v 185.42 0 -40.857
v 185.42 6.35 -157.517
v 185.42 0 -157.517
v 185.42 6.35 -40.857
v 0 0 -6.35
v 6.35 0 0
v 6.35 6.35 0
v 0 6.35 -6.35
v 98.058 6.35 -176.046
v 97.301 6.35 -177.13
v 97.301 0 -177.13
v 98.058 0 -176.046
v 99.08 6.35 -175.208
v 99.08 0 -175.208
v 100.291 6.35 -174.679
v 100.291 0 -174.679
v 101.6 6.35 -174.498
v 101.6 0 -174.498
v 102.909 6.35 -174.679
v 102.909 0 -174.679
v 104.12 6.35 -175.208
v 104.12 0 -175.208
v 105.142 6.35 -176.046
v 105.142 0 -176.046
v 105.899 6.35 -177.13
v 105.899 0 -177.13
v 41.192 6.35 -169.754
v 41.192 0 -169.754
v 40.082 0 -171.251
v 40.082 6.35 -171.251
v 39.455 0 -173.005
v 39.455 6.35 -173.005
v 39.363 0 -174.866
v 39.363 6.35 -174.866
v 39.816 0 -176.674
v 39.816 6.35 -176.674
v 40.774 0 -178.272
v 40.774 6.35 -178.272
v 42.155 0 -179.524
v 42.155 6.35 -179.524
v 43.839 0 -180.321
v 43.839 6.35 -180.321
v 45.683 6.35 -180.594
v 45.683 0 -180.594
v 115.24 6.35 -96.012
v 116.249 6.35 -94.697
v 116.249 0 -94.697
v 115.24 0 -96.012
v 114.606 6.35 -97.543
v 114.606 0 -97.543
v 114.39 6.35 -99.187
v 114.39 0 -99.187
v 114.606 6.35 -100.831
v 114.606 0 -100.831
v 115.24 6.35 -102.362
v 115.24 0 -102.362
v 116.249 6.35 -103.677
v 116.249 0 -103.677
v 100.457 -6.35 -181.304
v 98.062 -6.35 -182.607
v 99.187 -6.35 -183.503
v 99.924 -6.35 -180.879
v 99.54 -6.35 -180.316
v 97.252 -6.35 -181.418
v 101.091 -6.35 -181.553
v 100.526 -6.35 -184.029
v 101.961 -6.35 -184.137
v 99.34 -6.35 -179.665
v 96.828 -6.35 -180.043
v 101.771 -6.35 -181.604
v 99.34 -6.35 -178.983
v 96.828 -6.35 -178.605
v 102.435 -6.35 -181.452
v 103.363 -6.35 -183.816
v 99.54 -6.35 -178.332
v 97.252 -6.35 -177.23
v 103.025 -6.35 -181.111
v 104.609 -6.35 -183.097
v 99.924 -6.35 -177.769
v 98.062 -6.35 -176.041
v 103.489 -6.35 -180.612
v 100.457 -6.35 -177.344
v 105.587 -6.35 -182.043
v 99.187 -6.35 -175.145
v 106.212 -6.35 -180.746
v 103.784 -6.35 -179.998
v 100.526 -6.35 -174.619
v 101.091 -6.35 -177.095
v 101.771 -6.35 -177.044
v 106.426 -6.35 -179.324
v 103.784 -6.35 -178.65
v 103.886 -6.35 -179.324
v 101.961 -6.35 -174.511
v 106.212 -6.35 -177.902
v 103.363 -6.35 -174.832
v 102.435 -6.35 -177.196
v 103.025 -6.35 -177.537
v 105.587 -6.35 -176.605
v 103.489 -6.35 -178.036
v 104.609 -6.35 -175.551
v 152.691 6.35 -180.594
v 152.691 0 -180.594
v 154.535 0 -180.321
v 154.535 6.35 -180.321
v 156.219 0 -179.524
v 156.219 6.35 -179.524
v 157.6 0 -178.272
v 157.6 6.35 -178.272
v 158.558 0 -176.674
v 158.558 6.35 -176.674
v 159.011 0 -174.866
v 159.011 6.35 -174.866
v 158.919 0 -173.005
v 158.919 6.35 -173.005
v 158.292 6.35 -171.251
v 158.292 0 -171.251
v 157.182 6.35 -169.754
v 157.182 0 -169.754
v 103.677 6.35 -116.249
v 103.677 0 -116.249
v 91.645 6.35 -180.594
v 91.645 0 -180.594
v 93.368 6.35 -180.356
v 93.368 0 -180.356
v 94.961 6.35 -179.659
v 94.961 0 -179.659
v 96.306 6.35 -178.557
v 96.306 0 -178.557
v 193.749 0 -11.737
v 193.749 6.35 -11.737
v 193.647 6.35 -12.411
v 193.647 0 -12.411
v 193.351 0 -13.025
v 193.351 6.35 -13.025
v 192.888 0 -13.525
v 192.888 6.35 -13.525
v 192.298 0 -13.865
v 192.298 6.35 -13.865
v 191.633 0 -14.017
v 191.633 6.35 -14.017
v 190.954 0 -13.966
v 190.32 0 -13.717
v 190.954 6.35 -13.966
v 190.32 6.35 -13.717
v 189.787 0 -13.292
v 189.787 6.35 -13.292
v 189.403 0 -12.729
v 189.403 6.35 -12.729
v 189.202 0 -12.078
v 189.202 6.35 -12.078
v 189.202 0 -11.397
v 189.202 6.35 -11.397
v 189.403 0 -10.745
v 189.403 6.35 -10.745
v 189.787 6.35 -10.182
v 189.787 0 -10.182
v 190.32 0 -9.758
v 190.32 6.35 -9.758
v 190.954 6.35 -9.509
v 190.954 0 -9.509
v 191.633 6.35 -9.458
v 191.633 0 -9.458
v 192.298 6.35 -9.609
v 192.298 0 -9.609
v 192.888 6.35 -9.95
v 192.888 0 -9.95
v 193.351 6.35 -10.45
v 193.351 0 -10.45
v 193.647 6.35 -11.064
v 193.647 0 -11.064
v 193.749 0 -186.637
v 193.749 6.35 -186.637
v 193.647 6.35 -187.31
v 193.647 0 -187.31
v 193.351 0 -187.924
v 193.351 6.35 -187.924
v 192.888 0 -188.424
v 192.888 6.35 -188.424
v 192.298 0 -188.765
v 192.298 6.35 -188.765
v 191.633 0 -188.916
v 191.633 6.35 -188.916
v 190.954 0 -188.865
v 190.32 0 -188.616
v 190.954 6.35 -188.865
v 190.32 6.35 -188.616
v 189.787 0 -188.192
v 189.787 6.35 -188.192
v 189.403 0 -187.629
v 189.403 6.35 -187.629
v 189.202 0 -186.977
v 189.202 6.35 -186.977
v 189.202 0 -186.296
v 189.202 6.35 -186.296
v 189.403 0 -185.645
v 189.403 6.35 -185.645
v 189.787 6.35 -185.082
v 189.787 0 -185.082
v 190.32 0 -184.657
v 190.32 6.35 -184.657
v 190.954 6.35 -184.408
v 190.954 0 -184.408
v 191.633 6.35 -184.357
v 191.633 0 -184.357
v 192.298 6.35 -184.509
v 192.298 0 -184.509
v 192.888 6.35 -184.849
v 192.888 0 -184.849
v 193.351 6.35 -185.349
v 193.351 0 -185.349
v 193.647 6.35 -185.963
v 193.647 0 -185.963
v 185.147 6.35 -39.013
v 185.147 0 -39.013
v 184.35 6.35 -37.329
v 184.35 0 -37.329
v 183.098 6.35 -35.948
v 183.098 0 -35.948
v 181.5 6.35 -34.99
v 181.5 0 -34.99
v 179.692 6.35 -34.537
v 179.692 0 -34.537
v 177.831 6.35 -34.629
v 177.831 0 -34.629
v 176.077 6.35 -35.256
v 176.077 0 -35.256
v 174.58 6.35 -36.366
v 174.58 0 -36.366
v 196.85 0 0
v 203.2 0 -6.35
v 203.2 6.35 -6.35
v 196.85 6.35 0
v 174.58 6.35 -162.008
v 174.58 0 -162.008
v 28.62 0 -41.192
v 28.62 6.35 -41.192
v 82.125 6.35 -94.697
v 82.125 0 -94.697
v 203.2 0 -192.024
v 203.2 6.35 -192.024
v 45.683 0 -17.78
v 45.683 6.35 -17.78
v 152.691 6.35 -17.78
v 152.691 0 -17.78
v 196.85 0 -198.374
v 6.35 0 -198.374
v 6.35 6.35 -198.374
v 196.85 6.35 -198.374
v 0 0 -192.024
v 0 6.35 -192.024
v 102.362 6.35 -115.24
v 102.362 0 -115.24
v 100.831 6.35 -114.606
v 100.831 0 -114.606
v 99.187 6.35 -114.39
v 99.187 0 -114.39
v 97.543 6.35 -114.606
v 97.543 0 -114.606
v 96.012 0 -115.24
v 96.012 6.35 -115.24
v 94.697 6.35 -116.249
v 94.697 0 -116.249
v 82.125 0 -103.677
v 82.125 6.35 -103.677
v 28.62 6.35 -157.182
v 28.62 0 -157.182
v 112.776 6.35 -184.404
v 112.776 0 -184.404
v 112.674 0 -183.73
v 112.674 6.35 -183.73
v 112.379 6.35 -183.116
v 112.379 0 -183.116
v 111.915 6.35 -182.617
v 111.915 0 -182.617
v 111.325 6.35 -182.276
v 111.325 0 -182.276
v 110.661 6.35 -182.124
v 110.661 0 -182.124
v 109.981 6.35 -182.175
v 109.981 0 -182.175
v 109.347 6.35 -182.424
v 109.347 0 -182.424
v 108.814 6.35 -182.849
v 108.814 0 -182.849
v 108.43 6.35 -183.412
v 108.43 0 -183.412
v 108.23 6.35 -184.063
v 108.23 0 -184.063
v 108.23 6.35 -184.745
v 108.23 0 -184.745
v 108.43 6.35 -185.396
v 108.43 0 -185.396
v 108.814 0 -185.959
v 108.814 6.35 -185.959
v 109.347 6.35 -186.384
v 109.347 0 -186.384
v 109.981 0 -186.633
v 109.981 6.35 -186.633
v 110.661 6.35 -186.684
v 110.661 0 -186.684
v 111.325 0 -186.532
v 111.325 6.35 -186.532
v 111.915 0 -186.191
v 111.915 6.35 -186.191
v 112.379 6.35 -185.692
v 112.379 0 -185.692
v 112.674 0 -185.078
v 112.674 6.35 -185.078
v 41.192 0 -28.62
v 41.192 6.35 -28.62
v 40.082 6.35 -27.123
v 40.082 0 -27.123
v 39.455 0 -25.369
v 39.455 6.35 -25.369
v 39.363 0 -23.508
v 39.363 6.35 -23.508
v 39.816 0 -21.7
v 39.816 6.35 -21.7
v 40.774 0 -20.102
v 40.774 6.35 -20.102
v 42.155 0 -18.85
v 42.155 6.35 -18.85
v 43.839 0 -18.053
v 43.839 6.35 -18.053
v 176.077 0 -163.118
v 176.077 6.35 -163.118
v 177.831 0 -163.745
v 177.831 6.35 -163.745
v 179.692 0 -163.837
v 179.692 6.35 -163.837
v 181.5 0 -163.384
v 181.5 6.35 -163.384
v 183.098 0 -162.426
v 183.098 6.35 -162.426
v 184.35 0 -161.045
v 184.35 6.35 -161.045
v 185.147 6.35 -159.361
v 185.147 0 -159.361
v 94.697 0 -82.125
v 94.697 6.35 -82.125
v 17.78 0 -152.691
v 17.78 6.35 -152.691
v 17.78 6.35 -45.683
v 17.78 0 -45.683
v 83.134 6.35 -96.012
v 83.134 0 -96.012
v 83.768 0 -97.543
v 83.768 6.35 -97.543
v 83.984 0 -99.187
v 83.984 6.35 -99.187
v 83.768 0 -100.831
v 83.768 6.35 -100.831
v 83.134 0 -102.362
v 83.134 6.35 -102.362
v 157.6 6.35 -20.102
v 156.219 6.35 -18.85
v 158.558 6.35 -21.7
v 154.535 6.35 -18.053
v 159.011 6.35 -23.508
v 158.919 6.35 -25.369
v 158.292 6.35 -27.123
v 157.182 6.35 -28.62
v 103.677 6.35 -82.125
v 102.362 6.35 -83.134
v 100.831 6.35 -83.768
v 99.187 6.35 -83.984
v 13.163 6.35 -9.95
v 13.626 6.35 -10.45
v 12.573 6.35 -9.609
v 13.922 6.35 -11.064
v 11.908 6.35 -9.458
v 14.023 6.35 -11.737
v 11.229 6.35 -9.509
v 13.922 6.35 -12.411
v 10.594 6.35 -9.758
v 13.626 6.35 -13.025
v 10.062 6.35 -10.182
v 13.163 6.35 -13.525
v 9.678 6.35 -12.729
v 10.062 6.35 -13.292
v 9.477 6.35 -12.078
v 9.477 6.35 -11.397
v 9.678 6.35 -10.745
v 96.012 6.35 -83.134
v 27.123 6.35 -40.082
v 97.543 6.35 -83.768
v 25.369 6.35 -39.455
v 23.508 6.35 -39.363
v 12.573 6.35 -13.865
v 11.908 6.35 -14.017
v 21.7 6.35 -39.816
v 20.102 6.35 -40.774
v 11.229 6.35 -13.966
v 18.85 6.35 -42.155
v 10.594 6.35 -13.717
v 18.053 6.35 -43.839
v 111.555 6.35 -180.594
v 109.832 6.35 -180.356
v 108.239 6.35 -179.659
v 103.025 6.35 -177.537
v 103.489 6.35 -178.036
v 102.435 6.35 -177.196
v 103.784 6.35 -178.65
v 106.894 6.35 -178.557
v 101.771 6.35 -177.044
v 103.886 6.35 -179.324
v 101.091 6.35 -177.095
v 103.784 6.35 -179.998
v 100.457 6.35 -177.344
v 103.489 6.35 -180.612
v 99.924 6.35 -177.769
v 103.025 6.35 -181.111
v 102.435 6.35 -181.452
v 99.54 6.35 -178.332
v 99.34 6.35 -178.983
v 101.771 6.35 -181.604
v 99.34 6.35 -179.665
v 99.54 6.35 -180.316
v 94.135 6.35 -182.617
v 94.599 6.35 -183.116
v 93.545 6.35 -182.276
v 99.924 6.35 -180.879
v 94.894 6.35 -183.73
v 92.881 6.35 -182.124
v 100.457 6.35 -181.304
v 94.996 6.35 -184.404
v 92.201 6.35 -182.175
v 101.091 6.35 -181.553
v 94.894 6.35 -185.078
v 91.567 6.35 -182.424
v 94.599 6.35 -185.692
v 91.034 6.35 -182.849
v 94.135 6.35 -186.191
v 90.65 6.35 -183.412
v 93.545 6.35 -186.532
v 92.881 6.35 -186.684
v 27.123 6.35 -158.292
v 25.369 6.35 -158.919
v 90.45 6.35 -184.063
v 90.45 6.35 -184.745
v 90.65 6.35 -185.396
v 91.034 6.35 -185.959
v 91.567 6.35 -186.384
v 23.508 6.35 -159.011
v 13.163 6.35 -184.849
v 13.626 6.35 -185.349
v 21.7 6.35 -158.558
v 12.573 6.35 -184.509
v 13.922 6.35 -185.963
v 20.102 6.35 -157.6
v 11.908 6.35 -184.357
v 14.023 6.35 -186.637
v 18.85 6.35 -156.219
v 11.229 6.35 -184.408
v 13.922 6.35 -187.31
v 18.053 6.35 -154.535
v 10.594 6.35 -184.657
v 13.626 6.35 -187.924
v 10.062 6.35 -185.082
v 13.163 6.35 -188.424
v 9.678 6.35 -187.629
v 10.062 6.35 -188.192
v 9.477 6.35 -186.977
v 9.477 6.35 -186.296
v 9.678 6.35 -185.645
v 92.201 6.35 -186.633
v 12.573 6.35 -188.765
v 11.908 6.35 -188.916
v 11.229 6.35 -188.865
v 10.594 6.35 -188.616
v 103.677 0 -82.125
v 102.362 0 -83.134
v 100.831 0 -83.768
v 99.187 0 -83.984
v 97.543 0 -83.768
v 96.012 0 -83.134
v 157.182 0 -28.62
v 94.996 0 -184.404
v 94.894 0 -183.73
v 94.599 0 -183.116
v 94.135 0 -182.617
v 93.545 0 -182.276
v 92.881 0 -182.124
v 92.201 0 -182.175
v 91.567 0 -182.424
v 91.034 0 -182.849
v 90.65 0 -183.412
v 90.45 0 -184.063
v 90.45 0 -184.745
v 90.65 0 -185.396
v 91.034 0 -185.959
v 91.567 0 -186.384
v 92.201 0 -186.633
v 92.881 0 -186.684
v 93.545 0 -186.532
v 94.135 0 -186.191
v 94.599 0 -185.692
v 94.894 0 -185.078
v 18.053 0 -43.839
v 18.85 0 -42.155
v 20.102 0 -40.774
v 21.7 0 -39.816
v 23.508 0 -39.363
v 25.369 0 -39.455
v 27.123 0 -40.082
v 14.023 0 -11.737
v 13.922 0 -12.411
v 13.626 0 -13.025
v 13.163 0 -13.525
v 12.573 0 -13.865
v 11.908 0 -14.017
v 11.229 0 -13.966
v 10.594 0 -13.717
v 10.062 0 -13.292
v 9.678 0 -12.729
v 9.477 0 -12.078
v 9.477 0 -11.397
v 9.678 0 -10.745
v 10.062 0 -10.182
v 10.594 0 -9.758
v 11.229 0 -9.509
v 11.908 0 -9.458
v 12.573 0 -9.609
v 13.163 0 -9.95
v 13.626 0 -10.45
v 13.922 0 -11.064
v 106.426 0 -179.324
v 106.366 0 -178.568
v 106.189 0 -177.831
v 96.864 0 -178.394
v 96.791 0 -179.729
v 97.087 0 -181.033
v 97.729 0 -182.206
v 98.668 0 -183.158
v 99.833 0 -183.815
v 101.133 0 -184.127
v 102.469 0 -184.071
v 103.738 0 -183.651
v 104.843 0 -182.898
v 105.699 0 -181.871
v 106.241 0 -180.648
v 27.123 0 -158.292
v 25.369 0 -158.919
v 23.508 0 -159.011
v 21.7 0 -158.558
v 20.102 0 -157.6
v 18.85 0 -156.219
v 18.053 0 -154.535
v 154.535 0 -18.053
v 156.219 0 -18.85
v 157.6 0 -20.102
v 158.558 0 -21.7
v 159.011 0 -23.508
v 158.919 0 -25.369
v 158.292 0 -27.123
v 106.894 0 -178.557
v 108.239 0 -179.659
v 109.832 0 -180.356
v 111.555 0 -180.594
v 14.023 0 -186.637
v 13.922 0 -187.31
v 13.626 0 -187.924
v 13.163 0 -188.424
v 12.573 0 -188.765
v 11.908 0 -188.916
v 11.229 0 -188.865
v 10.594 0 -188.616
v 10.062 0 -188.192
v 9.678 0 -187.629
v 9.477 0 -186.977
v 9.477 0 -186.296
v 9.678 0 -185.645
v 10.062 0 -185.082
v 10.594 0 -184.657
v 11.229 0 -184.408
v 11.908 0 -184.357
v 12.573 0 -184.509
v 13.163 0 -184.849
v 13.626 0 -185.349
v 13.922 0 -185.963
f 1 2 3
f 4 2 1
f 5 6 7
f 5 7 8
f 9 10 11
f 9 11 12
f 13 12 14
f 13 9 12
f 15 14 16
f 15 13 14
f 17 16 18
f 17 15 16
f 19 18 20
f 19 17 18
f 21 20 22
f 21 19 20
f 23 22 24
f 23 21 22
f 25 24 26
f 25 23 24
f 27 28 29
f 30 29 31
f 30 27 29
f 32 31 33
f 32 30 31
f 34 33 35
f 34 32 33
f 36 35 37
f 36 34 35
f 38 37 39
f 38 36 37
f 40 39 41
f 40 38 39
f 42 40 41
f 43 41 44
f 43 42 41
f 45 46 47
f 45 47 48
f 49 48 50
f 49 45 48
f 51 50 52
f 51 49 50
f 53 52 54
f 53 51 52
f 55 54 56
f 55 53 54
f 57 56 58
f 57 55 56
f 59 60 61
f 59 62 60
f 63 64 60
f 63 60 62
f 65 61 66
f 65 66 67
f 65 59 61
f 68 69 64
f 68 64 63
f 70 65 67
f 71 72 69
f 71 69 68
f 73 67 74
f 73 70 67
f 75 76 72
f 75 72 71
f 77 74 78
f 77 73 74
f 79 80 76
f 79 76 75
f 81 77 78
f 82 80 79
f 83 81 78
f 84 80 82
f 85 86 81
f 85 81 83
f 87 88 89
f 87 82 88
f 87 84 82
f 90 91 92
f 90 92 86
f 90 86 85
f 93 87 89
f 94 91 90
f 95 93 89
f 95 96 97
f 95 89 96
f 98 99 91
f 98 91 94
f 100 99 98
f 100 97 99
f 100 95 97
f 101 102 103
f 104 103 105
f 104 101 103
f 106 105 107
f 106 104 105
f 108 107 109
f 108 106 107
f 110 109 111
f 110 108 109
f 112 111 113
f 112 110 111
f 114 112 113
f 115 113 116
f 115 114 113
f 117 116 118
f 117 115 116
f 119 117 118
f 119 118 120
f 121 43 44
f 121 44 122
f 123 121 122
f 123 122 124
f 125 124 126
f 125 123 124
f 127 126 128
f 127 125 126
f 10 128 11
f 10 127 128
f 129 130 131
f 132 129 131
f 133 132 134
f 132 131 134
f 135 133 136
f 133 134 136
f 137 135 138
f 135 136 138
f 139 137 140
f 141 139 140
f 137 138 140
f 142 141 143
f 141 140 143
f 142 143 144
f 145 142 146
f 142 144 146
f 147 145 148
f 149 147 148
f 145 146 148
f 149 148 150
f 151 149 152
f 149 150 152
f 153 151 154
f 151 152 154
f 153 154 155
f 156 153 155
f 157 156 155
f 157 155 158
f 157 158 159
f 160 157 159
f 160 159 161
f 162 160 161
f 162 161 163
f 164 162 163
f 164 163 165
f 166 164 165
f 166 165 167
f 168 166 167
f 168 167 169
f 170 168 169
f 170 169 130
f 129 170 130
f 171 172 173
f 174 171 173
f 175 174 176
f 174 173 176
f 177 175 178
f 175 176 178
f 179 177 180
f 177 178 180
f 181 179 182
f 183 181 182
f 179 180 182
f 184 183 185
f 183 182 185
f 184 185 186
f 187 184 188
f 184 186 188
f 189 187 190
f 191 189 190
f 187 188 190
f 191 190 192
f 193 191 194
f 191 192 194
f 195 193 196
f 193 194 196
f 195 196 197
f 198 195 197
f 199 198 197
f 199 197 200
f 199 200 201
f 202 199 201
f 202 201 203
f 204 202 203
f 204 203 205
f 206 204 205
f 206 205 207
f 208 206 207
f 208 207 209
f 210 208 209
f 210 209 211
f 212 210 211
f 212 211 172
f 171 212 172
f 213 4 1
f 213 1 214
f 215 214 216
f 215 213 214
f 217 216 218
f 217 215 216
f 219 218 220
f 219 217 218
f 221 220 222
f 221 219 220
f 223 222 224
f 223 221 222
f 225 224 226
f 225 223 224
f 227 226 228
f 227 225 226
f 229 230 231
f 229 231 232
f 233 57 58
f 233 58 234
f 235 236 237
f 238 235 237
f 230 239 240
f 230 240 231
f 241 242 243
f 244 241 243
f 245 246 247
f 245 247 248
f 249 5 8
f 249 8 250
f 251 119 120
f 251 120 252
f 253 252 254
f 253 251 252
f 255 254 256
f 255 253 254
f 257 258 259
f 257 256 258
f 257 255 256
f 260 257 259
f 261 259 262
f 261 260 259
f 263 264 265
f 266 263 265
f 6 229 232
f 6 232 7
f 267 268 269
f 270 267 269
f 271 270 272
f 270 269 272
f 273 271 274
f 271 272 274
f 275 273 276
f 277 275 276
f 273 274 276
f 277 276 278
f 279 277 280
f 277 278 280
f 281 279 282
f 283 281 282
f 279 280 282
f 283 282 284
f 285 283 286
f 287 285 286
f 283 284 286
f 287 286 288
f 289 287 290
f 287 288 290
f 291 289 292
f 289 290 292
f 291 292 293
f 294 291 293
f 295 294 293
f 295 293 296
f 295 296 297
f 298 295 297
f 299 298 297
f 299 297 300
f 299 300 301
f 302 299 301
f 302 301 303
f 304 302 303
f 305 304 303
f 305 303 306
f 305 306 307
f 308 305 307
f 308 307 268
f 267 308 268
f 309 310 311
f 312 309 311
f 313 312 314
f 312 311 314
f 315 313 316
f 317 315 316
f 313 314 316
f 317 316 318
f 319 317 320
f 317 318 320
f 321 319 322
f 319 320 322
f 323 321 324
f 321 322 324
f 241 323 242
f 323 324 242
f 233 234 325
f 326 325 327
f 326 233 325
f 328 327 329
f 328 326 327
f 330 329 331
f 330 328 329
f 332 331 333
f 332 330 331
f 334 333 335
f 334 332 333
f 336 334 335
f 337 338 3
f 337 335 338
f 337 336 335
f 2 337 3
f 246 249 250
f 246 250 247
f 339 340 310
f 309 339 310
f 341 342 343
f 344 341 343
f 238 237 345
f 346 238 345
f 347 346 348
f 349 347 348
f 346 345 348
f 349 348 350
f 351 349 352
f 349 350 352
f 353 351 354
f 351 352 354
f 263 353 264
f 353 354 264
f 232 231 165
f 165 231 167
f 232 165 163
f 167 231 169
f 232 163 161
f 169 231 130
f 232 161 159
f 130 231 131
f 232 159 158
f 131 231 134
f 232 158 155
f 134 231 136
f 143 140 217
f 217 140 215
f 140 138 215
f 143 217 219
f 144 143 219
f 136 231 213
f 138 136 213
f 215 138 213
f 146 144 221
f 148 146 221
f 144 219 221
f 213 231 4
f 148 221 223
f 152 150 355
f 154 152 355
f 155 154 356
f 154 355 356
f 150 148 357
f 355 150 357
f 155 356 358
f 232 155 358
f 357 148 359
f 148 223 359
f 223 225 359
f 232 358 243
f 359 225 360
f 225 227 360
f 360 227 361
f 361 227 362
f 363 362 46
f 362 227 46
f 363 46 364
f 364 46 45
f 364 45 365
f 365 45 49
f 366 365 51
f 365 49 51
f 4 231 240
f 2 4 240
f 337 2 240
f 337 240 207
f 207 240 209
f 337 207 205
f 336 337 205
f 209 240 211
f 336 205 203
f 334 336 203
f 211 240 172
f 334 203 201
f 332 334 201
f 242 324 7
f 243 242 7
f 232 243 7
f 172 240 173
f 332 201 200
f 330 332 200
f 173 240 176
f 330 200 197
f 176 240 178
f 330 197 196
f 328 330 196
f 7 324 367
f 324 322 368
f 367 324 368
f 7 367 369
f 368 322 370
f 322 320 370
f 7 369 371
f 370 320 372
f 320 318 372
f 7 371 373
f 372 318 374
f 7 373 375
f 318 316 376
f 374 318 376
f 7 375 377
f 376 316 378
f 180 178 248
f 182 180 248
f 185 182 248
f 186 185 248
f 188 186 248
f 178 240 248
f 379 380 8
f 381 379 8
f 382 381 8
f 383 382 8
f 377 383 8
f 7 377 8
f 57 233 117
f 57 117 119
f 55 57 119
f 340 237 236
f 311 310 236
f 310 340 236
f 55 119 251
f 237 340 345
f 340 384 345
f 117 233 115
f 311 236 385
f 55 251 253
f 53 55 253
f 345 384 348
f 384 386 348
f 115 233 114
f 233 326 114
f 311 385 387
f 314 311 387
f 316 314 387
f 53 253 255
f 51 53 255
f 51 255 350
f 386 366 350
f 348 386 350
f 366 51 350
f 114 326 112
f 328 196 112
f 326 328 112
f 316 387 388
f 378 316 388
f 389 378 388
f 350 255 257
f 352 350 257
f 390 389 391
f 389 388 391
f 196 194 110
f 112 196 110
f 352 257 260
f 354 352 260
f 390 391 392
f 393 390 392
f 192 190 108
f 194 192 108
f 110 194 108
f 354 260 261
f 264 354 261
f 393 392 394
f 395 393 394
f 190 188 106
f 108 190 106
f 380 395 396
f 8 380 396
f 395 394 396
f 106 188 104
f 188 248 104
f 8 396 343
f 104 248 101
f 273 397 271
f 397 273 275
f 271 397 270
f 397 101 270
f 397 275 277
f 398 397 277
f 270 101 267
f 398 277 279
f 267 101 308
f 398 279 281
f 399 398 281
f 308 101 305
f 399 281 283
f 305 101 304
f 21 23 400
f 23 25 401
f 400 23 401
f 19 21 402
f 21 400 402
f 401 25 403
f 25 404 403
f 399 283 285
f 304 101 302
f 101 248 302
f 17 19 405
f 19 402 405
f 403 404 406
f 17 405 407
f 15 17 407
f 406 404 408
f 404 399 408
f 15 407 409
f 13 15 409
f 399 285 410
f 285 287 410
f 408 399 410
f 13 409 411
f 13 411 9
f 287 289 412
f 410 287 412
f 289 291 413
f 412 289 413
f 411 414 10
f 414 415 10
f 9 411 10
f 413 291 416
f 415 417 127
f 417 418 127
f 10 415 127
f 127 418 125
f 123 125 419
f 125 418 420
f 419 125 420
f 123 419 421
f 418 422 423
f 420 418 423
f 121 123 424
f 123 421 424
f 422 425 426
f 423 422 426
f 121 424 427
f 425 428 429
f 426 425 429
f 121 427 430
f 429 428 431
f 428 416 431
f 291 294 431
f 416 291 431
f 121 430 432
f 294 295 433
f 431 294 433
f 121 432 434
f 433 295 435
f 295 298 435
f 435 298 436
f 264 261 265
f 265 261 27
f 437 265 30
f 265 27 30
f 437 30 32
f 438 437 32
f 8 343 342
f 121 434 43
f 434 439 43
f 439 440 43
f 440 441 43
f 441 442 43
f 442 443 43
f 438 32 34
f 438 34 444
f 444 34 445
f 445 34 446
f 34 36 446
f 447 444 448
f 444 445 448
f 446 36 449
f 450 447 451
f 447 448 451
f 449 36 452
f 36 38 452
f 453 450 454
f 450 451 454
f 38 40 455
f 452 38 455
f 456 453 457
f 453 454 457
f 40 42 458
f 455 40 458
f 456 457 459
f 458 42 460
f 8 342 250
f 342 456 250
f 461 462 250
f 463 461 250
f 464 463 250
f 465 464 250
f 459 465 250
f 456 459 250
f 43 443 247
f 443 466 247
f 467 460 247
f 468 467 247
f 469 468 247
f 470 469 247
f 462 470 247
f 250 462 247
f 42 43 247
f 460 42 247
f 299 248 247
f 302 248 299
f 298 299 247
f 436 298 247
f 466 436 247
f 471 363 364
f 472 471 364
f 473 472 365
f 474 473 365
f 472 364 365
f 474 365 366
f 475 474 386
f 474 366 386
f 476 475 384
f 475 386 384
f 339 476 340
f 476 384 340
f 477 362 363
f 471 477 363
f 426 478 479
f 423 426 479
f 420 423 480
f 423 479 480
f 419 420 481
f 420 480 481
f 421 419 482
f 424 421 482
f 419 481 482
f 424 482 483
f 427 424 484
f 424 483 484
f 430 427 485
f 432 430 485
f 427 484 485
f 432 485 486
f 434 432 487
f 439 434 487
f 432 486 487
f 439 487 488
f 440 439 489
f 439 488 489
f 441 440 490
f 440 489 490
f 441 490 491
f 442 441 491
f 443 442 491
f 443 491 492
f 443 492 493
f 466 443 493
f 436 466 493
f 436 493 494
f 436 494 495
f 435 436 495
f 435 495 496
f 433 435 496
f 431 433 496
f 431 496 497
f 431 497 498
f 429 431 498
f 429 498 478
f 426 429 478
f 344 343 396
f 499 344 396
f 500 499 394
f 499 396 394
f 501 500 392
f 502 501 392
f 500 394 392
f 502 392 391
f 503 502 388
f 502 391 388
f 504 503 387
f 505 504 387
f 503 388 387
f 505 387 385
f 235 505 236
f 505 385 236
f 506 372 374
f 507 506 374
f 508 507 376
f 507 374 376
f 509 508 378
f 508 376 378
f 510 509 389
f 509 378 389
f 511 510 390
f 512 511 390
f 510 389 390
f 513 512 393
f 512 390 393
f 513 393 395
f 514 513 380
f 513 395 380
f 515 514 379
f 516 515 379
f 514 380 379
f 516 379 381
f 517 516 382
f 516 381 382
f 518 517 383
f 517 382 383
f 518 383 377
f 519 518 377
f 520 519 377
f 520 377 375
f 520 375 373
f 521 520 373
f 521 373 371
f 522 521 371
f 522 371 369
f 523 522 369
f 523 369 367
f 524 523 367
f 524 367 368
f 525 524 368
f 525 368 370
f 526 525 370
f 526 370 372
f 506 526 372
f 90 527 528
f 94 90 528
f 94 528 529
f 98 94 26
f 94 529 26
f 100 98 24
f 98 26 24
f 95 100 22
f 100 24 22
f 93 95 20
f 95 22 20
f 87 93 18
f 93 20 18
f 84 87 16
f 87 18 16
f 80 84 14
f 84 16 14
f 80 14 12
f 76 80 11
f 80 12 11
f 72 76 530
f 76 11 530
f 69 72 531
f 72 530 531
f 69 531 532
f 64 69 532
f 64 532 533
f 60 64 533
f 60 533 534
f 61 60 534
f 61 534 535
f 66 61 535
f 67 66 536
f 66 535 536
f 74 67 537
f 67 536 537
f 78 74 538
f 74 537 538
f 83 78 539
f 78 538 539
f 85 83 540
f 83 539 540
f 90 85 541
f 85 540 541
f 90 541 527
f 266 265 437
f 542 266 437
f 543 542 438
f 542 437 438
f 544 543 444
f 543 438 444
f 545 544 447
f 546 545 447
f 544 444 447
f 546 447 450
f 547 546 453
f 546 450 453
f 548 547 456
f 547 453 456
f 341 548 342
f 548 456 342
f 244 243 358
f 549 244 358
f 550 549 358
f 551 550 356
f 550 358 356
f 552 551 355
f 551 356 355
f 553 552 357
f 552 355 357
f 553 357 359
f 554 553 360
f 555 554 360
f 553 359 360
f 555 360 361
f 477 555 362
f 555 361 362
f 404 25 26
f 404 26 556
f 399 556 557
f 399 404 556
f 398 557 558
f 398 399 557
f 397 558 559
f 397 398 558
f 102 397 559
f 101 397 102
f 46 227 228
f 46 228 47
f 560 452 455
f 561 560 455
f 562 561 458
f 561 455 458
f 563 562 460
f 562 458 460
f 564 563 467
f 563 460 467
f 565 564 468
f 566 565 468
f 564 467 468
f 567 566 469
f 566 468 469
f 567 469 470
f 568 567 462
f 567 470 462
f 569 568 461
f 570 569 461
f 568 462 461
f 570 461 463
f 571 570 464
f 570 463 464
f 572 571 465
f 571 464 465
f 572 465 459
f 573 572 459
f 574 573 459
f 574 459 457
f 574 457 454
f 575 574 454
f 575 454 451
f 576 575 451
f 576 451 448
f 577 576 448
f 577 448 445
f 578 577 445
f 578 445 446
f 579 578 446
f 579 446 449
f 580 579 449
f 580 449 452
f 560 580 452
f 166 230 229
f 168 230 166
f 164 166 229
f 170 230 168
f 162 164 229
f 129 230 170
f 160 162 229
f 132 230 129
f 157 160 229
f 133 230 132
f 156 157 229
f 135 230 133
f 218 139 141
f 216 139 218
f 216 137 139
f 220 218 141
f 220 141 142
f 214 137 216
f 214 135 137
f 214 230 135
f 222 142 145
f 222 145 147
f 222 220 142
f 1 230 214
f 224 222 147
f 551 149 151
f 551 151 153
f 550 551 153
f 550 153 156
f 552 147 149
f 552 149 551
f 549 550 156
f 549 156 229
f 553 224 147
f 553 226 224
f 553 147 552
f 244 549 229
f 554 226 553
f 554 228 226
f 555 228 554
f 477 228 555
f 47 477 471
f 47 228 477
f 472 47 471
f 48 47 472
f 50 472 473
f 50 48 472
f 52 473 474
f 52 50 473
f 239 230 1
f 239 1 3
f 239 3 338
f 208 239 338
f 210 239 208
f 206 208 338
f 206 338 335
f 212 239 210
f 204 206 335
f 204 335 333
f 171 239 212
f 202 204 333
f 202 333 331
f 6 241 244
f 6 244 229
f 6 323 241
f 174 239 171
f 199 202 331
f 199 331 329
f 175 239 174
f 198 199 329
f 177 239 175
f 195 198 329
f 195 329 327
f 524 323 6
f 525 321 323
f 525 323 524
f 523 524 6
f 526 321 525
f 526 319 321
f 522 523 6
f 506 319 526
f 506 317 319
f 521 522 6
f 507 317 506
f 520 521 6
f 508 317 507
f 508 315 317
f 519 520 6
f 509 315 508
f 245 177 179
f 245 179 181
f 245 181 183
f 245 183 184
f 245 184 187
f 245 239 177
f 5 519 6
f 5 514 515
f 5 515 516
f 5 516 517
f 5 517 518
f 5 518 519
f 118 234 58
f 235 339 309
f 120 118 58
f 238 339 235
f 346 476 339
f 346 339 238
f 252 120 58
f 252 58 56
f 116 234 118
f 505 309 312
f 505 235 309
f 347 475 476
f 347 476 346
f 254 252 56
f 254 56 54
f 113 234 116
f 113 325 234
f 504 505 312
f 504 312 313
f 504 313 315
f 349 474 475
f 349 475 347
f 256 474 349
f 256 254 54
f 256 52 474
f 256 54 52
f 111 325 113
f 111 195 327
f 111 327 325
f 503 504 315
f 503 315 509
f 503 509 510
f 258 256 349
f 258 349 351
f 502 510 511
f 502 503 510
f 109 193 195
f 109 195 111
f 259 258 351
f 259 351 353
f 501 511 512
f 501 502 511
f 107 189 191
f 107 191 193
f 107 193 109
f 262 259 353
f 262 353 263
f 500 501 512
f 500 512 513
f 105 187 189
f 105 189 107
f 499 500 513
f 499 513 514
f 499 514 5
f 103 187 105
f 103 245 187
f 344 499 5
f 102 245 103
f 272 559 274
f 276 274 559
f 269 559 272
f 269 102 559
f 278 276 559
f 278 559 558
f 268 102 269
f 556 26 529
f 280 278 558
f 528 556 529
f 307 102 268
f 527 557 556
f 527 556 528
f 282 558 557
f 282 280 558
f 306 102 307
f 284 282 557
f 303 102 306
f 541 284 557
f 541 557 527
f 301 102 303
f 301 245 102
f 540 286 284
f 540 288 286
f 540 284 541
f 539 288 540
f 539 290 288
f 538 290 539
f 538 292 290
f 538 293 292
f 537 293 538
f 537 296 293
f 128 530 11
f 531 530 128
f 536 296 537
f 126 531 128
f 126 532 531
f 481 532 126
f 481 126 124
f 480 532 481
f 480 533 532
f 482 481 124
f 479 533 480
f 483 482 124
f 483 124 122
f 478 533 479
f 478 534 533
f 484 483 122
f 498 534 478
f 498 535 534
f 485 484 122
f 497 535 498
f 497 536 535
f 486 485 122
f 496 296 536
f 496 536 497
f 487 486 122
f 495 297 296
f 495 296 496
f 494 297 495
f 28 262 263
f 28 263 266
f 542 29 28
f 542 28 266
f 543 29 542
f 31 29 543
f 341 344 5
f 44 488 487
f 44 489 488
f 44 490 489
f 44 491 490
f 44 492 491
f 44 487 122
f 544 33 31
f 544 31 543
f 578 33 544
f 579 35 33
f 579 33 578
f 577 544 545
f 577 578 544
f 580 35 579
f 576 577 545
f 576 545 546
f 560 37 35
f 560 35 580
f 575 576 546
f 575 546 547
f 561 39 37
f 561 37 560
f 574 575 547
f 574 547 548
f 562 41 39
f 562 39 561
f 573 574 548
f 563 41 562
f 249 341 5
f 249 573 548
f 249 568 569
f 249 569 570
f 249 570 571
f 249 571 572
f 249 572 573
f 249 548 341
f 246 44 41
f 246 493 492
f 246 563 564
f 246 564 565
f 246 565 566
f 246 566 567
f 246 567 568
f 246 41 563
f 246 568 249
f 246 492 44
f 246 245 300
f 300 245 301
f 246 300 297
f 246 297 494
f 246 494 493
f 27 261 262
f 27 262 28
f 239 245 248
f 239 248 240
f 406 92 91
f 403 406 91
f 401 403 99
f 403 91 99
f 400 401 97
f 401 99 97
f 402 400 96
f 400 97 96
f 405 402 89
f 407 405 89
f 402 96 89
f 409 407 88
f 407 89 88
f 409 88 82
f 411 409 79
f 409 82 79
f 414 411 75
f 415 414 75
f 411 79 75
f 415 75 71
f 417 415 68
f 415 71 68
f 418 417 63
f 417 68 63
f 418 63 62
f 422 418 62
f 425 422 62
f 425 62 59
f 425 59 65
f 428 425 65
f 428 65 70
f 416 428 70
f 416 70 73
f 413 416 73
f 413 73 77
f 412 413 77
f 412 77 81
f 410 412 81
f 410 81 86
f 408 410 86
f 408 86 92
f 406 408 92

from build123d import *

# Parameters (mm, degrees)
BOSS_EXTRUDE1_DEPTH = 6.35
CUT_EXTRUDE1_DEPTH  = 7.35
SKETCH3_R           = 2.286
CUT_EXTRUDE2_DEPTH  = 7.35
BOSS_EXTRUDE2_DEPTH = 6.35
SKETCH5_R           = 4.826
BOSS_EXTRUDE3_DEPTH = 6.35
SKETCH6_R           = 2.286
CUT_EXTRUDE3_DEPTH  = 13.7


with BuildPart() as part:
    # Sketch1 → Boss-Extrude1 (new body)
    with BuildSketch(Plane(origin=(0, 0, 0), x_dir=(1, 0, 0), z_dir=(0, 1, 0))):
        Polygon((0, 192.024), (6.35, 198.374), (196.85, 198.374), (203.2, 192.024), (203.2, 6.35), (196.85, 0), (6.35, 0), (0, 6.35), align=None)
    extrude(amount=BOSS_EXTRUDE1_DEPTH)

    # Sketch2 → Cut-Extrude1 (cut, through all)
    with BuildSketch(Plane(origin=(0, 6.35, 0), x_dir=(1, 0, 0), z_dir=(0, 1, 0))):
        with BuildLine():
            Line((45.682614691, 180.594), (152.691385309, 180.594))
            ThreePointArc((152.691385309, 180.594), (158.558020341, 176.674039796), (157.18151337, 169.753871939))
            Line((157.18151337, 169.753871939), (103.677128061, 116.24948663))
            ThreePointArc((103.677128061, 116.24948663), (99.187, 114.389614691), (94.696871939, 116.24948663))
            Line((94.696871939, 116.24948663), (41.19248663, 169.753871939))
            ThreePointArc((41.19248663, 169.753871939), (39.815979659, 176.674039796), (45.682614691, 180.594))
        make_face()
        with BuildLine():
            Line((17.78, 152.691385309), (17.78, 45.682614691))
            ThreePointArc((17.78, 45.682614691), (21.699960204, 39.815979659), (28.620128061, 41.19248663))
            Line((28.620128061, 41.19248663), (82.12451337, 94.696871939))
            ThreePointArc((82.12451337, 94.696871939), (83.984385309, 99.187), (82.12451337, 103.677128061))
            Line((82.12451337, 103.677128061), (28.620128061, 157.18151337))
            ThreePointArc((28.620128061, 157.18151337), (21.699960204, 158.558020341), (17.78, 152.691385309))
        make_face()
        with BuildLine():
            Line((45.682614691, 17.78), (152.691385309, 17.78))
            ThreePointArc((152.691385309, 17.78), (158.558020341, 21.699960204), (157.18151337, 28.620128061))
            Line((157.18151337, 28.620128061), (103.677128061, 82.12451337))
            ThreePointArc((103.677128061, 82.12451337), (99.187, 83.984385309), (94.696871939, 82.12451337))
            Line((94.696871939, 82.12451337), (41.19248663, 28.620128061))
            ThreePointArc((41.19248663, 28.620128061), (39.815979659, 21.699960204), (45.682614691, 17.78))
        make_face()
        with BuildLine():
            Line((185.42, 157.517385309), (185.42, 40.856614691))
            ThreePointArc((185.42, 40.856614691), (181.500039796, 34.989979659), (174.579871939, 36.36648663))
            Line((174.579871939, 36.36648663), (116.24948663, 94.696871939))
            ThreePointArc((116.24948663, 94.696871939), (114.389614691, 99.187), (116.24948663, 103.677128061))
            Line((116.24948663, 103.677128061), (174.579871939, 162.00751337))
            ThreePointArc((174.579871939, 162.00751337), (181.500039796, 163.384020341), (185.42, 157.517385309))
        make_face()
    extrude(amount=-CUT_EXTRUDE1_DEPTH, mode=Mode.SUBTRACT)

    # Sketch3 → Cut-Extrude2 (cut, through all)
    with BuildSketch(Plane(origin=(0, 6.35, 0), x_dir=(1, 0, 0), z_dir=(0, 1, 0))):
        with Locations((11.73734, 11.73734)):
            Circle(SKETCH3_R)
        with Locations((191.46266, 11.73734)):
            Circle(SKETCH3_R)
        with Locations((191.46266, 186.63666)):
            Circle(SKETCH3_R)
        with Locations((11.73734, 186.63666)):
            Circle(SKETCH3_R)
    extrude(amount=-CUT_EXTRUDE2_DEPTH, mode=Mode.SUBTRACT)

    # Sketch4 → Boss-Extrude2 (add)
    with BuildSketch(Plane(origin=(0, 6.35, 0), x_dir=(1, 0, 0), z_dir=(0, 1, 0))):
        with BuildLine():
            Line((111.554726315, 180.594), (91.645273685, 180.594))
            ThreePointArc((91.645273685, 180.594), (94.961453031, 179.659298195), (97.301368182, 177.130363636))
            ThreePointArc((97.301368182, 177.130363636), (101.6, 174.498), (105.898631818, 177.130363636))
            ThreePointArc((105.898631818, 177.130363636), (108.238546969, 179.659298195), (111.554726315, 180.594))
        make_face()
    extrude(amount=-BOSS_EXTRUDE2_DEPTH)

    # Sketch5 → Boss-Extrude3 (add)
    with BuildSketch(Plane.XZ):
        with Locations((101.6, -179.324)):
            Circle(SKETCH5_R)
    extrude(amount=BOSS_EXTRUDE3_DEPTH)

    # Sketch6 → Cut-Extrude3 (cut, through all)
    with BuildSketch(Plane.XZ.offset(6.35)):
        with Locations((101.6, -179.324)):
            Circle(SKETCH6_R)
        with Locations((92.71, -184.404)):
            Circle(SKETCH6_R)
        with Locations((110.49, -184.404)):
            Circle(SKETCH6_R)
    extrude(amount=-CUT_EXTRUDE3_DEPTH, mode=Mode.SUBTRACT)


solid = part.part
